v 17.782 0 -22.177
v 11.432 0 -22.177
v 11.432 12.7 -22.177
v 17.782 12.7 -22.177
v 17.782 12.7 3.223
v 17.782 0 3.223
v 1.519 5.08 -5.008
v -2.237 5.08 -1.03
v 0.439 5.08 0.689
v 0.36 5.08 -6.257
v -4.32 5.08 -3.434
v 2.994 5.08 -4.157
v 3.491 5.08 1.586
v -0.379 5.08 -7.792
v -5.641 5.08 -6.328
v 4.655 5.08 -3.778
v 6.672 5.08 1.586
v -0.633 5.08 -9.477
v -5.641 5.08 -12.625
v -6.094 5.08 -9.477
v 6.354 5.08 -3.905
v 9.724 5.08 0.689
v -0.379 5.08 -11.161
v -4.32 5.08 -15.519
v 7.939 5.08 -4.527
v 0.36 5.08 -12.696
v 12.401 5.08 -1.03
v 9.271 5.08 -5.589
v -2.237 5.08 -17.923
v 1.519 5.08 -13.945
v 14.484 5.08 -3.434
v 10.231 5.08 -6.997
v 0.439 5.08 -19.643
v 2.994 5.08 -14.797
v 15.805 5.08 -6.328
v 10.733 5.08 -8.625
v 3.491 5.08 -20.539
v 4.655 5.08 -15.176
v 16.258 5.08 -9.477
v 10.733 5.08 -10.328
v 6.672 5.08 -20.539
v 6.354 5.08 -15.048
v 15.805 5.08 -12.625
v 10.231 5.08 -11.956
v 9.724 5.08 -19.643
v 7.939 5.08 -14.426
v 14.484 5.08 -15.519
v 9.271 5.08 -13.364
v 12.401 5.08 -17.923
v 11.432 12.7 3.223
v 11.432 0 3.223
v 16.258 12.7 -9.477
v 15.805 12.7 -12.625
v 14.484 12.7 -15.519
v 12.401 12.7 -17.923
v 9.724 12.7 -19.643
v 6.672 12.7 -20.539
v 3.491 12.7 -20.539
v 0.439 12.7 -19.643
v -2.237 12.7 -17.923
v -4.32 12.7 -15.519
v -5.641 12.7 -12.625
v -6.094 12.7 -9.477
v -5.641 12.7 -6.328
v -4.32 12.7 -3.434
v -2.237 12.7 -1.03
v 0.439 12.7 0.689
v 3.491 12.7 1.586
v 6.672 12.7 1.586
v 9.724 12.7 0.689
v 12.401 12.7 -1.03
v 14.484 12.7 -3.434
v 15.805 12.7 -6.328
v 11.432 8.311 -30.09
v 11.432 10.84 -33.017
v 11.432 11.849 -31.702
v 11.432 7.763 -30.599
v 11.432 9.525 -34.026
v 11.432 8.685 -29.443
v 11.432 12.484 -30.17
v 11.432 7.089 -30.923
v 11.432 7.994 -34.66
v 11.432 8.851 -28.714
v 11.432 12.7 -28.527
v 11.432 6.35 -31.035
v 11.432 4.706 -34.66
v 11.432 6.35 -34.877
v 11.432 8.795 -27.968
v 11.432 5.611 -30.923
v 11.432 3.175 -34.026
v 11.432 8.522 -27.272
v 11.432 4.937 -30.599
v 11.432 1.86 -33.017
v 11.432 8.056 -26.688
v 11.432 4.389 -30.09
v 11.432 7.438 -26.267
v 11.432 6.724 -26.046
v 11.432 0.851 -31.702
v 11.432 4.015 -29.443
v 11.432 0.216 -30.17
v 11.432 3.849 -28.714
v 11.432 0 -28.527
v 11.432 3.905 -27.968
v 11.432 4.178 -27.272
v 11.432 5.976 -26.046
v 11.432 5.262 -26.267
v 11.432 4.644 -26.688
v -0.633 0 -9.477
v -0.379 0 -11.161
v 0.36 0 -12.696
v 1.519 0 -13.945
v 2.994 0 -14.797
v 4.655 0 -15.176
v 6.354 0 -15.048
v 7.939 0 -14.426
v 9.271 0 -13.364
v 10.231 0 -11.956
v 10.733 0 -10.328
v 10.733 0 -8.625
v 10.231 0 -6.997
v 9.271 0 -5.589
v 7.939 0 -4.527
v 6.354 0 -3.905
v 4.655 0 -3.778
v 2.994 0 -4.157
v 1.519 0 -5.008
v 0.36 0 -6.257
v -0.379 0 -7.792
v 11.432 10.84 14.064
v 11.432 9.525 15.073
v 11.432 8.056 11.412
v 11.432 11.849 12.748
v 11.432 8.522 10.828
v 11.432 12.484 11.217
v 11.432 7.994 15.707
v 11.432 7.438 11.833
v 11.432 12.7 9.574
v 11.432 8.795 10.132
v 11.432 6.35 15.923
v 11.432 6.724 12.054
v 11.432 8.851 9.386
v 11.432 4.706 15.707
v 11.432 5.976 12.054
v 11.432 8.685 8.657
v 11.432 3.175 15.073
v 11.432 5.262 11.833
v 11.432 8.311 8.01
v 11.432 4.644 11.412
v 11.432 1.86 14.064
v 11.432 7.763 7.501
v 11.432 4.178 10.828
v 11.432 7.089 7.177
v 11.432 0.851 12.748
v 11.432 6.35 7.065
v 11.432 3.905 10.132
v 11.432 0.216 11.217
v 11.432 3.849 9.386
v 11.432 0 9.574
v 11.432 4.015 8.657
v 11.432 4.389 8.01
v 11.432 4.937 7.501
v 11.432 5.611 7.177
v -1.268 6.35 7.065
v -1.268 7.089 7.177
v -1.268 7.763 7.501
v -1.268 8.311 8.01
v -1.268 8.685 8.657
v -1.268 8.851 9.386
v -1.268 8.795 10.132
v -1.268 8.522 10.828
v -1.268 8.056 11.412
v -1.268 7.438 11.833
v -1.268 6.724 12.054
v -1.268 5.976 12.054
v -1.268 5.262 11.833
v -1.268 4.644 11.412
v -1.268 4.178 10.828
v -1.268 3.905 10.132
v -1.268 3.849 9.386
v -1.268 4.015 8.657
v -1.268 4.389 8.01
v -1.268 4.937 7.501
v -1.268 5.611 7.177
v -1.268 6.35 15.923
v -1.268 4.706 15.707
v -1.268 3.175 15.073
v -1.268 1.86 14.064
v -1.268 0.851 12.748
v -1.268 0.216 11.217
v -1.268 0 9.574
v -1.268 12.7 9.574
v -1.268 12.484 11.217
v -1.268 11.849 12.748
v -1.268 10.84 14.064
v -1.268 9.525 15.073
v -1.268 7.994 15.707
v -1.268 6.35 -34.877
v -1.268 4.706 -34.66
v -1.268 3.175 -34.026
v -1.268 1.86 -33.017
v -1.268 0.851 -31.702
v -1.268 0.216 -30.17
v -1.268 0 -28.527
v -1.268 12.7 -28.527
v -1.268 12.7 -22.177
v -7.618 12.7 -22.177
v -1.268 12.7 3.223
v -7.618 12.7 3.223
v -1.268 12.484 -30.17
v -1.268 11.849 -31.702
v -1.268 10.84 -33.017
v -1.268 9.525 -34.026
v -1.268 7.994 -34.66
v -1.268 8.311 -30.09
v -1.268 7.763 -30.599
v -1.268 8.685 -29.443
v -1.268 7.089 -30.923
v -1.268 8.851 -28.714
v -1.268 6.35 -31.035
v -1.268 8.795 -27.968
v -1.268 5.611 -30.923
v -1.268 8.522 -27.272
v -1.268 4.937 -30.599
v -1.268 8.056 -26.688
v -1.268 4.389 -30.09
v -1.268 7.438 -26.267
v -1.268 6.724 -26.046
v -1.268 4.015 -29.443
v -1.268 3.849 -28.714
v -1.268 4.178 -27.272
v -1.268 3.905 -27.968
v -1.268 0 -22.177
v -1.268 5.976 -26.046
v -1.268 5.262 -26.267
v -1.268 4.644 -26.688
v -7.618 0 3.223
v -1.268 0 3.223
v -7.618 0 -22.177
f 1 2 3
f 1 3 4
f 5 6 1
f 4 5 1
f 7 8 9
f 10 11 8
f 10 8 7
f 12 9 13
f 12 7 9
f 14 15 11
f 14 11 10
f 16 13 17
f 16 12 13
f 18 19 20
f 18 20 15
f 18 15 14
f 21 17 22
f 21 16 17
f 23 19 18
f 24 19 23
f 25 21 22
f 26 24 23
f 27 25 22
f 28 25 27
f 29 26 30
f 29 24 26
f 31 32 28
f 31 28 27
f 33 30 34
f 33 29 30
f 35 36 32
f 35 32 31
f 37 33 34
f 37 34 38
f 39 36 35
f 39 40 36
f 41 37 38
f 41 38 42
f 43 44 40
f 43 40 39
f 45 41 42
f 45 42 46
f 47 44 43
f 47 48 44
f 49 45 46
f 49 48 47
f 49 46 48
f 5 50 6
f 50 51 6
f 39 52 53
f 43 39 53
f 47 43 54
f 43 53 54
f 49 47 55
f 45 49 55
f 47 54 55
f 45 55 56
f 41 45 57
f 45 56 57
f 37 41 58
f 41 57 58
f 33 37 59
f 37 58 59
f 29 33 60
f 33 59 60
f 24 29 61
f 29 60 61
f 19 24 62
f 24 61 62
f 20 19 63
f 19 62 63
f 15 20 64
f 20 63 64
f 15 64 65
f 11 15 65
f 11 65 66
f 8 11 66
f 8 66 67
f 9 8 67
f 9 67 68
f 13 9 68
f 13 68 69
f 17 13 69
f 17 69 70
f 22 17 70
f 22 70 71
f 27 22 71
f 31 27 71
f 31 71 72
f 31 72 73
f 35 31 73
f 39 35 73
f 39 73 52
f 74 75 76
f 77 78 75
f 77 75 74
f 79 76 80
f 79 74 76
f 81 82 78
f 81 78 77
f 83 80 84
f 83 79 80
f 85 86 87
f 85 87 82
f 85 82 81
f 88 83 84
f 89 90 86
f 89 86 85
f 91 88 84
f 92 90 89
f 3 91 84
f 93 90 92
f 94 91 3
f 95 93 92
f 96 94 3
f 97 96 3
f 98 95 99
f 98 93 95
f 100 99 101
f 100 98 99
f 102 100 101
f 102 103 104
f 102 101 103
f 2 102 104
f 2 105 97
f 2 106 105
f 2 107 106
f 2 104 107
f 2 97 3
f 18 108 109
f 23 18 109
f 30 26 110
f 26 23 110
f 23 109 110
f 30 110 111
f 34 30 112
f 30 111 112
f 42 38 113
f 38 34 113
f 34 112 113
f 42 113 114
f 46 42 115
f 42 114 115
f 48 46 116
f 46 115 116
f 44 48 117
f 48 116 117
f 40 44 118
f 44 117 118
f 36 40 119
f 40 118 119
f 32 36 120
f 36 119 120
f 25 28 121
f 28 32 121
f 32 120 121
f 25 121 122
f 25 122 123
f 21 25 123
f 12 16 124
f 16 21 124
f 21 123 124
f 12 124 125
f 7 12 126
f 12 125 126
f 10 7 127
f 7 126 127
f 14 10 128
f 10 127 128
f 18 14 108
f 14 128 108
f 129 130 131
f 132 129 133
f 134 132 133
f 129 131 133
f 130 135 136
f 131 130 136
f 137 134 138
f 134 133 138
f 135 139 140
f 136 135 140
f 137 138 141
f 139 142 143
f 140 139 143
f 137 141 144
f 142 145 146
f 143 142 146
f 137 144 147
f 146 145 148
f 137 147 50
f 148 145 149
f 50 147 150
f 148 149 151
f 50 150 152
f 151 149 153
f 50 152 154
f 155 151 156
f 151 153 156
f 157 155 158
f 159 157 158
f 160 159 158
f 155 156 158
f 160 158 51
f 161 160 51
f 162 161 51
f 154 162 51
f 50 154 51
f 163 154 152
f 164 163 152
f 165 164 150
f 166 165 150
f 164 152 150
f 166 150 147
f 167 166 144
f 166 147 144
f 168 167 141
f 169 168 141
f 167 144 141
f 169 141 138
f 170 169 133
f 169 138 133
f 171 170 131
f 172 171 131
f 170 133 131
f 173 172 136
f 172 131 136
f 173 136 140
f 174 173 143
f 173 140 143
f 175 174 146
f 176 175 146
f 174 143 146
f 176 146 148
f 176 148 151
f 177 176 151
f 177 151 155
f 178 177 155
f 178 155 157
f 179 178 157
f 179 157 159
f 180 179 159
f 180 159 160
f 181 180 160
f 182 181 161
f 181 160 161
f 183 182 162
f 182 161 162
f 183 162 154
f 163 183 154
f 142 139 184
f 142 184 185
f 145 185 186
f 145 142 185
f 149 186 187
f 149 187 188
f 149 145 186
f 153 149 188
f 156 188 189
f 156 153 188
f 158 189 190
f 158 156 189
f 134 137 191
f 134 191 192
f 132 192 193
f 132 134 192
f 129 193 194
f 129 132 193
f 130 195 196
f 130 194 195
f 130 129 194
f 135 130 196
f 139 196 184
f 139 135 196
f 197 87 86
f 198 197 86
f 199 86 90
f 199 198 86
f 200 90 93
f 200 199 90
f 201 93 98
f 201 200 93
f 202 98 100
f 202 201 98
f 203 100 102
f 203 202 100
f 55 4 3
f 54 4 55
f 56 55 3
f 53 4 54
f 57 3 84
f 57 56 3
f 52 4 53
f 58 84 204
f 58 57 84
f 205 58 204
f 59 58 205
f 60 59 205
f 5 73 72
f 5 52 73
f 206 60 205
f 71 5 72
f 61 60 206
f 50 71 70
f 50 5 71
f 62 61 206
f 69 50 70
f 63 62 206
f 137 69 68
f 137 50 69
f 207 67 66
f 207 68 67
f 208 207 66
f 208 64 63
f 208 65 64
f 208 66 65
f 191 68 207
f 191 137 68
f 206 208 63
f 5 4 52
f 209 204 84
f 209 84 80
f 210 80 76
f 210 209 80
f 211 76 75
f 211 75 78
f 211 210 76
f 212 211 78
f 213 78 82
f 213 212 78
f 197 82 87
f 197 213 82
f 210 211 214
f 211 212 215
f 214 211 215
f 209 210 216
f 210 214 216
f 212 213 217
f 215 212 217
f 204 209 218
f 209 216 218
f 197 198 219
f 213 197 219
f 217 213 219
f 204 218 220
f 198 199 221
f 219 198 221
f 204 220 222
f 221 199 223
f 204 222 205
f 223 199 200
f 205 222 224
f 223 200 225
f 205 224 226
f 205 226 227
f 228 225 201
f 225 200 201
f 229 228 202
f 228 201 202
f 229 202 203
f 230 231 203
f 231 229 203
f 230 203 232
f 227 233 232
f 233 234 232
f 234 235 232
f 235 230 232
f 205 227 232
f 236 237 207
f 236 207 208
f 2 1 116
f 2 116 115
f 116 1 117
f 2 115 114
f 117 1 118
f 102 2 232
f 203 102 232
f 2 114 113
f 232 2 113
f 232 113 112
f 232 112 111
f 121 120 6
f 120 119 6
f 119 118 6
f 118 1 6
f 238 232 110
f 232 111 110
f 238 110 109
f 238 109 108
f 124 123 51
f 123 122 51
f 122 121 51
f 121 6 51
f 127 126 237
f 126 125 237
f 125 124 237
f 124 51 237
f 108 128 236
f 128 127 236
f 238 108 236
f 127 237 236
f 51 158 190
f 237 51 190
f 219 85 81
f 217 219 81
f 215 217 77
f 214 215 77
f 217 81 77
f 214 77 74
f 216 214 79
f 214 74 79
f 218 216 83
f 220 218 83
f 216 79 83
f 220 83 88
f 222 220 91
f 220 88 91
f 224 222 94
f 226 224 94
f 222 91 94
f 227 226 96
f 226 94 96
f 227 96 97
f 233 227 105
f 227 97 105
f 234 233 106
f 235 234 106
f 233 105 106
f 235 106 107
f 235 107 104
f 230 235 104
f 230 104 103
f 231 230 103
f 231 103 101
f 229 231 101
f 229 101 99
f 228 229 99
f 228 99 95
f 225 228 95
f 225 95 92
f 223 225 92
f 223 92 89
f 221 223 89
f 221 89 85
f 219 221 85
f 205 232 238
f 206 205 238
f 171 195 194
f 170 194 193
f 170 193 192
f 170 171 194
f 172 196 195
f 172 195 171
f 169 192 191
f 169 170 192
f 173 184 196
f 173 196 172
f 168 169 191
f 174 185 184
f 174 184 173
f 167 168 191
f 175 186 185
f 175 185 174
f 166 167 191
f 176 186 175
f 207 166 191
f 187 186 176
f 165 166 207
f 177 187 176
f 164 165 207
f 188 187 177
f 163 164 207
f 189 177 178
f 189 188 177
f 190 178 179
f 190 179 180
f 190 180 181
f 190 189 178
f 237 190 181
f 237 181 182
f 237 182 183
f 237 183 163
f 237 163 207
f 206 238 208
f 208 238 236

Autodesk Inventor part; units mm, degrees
ref_plane "YZ Plane" through (0, 0, 0) normal (1, 0, 0) x (0, 1, 0)
ref_plane "XZ Plane" through (0, 0, 0) normal (0, 1, 0) x (-1, 0, 0)
ref_plane "XY Plane" through (0, 0, 0) normal (0, 0, 1) x (1, 0, 0)
sketch "Sketch1" plane through (0, 0, 0) normal (0, 1, 0) x (-1, 0, 0)
  line L0 (7.6182, 15.9234) -> (-17.7818, 15.9234)
  line L1 (-17.7818, 15.9234) -> (-17.7818, -34.8766)
  line L2 (-17.7818, -34.8766) -> (7.6182, -34.8766)
  line L3 (7.6182, -34.8766) -> (7.6182, 15.9234)
  line L4 (7.6182, 15.9234) -> (1.2682, 15.9234)
  line L5 (1.2682, 15.9234) -> (1.2682, 3.2234)
  line L6 (1.2682, 3.2234) -> (7.6182, 3.2234)
  line L7 (7.6182, 3.2234) -> (7.6182, 15.9234)
  line L8 (-17.7818, 15.9234) -> (-11.4318, 15.9234)
  line L9 (-11.4318, 15.9234) -> (-11.4318, 3.2234)
  line L10 (-11.4318, 3.2234) -> (-17.7818, 3.2234)
  line L11 (-17.7818, 3.2234) -> (-17.7818, 15.9234)
  line L12 (-17.7818, -34.8766) -> (-11.4318, -34.8766)
  line L13 (-11.4318, -34.8766) -> (-11.4318, -22.1766)
  line L14 (-11.4318, -22.1766) -> (-17.7818, -22.1766)
  line L15 (-17.7818, -22.1766) -> (-17.7818, -34.8766)
  line L16 (7.6182, -34.8766) -> (1.2682, -34.8766)
  line L17 (1.2682, -34.8766) -> (1.2682, -22.1766)
  line L18 (1.2682, -22.1766) -> (7.6182, -22.1766)
  line L19 (7.6182, -22.1766) -> (7.6182, -34.8766)
  circle A0 centre (-5.0818, -9.4766) radius 5.715
  point P0 (0, 0)
  dimension "d0" = 25.4
  dimension "d1" = 50.8
  dimension "d2" = 6.35
  dimension "d3" = 12.7
  dimension "d4" = 6.35
  dimension "d5" = 12.7
  dimension "d6" = 6.35
  dimension "d7" = 12.7
  dimension "d8" = 11.43
extrude "Extrusion1" add sketch "Sketch1" along normal blind 12.7 contours L5 L6 L3 L18 L17 L2 L13 L14 L1 L10 L9 L0
sketch "Sketch2" plane through (11.4318, 0, 3.2234) normal (1, 0, 0) x (0, 0, -1)
  line L0 (-12.7, 0) -> (-12.7, 12.7) projected
  line L1 (-12.7, 12.7) -> (0, 12.7) projected
  line L2 (38.1, 12.7) -> (38.1, 0) projected
  circle A0 centre (-6.35, 6.35) radius 2.5083
  circle A1 centre (31.75, 6.35) radius 2.5082
  point P0 (3.2234, 0)
  dimension "d11" = 6.35
  dimension "d12" = 6.35
  dimension "d13" = 6.35
  dimension "d14" = 5.0165
  dimension "d15" = 5.0165
extrude "Extrusion2" cut sketch "Sketch2" against normal through all
sketch "Sketch3" plane through (0, 12.7, 0) normal (0, 1, 0) x (1, 0, 0)
  circle A0 centre (5.0818, 9.4766) radius 5.715 projected
  circle A1 centre (5.0818, 9.4766) radius 11.176
  point P0 (0, 0)
  dimension "d18" = 22.352
extrude "Extrusion3" cut sketch "Sketch3" against normal blind 7.62
fillet "Fillet1" radius 6.35 4 edges at (5.0818, 12.7, 15.9234) (5.0818, 0, 15.9234) (5.0818, 0, -34.8766) (5.0818, 12.7, -34.8766)
properties part number "top_anchor_v3"
